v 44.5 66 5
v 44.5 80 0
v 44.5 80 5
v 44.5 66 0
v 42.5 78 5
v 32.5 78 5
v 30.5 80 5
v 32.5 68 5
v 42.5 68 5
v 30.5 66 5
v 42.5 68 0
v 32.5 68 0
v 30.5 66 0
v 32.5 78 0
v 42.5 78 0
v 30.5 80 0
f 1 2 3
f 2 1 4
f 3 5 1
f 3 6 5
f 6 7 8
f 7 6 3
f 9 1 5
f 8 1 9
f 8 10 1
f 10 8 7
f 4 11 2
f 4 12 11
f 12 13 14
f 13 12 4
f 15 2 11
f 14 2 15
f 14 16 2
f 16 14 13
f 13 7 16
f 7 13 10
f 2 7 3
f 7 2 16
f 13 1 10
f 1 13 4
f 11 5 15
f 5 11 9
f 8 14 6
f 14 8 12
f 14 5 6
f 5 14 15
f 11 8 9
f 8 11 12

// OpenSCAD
union() {
    linear_extrude(height=5)
        import(file="monete-tecleando.dxf", layer="Circulo");
        
    linear_extrude(height=7)    
        import(file="monete-tecleando.dxf", layer="Monete");
        
    linear_extrude(height=7)    
        import(file="monete-tecleando.dxf", layer="Letras");
        
    translate([37.5, 73, 2.5])
        difference() {
            cube([14, 14, 5], center=true);

            cube([10, 10, 10], center=true);
        } 
} 
